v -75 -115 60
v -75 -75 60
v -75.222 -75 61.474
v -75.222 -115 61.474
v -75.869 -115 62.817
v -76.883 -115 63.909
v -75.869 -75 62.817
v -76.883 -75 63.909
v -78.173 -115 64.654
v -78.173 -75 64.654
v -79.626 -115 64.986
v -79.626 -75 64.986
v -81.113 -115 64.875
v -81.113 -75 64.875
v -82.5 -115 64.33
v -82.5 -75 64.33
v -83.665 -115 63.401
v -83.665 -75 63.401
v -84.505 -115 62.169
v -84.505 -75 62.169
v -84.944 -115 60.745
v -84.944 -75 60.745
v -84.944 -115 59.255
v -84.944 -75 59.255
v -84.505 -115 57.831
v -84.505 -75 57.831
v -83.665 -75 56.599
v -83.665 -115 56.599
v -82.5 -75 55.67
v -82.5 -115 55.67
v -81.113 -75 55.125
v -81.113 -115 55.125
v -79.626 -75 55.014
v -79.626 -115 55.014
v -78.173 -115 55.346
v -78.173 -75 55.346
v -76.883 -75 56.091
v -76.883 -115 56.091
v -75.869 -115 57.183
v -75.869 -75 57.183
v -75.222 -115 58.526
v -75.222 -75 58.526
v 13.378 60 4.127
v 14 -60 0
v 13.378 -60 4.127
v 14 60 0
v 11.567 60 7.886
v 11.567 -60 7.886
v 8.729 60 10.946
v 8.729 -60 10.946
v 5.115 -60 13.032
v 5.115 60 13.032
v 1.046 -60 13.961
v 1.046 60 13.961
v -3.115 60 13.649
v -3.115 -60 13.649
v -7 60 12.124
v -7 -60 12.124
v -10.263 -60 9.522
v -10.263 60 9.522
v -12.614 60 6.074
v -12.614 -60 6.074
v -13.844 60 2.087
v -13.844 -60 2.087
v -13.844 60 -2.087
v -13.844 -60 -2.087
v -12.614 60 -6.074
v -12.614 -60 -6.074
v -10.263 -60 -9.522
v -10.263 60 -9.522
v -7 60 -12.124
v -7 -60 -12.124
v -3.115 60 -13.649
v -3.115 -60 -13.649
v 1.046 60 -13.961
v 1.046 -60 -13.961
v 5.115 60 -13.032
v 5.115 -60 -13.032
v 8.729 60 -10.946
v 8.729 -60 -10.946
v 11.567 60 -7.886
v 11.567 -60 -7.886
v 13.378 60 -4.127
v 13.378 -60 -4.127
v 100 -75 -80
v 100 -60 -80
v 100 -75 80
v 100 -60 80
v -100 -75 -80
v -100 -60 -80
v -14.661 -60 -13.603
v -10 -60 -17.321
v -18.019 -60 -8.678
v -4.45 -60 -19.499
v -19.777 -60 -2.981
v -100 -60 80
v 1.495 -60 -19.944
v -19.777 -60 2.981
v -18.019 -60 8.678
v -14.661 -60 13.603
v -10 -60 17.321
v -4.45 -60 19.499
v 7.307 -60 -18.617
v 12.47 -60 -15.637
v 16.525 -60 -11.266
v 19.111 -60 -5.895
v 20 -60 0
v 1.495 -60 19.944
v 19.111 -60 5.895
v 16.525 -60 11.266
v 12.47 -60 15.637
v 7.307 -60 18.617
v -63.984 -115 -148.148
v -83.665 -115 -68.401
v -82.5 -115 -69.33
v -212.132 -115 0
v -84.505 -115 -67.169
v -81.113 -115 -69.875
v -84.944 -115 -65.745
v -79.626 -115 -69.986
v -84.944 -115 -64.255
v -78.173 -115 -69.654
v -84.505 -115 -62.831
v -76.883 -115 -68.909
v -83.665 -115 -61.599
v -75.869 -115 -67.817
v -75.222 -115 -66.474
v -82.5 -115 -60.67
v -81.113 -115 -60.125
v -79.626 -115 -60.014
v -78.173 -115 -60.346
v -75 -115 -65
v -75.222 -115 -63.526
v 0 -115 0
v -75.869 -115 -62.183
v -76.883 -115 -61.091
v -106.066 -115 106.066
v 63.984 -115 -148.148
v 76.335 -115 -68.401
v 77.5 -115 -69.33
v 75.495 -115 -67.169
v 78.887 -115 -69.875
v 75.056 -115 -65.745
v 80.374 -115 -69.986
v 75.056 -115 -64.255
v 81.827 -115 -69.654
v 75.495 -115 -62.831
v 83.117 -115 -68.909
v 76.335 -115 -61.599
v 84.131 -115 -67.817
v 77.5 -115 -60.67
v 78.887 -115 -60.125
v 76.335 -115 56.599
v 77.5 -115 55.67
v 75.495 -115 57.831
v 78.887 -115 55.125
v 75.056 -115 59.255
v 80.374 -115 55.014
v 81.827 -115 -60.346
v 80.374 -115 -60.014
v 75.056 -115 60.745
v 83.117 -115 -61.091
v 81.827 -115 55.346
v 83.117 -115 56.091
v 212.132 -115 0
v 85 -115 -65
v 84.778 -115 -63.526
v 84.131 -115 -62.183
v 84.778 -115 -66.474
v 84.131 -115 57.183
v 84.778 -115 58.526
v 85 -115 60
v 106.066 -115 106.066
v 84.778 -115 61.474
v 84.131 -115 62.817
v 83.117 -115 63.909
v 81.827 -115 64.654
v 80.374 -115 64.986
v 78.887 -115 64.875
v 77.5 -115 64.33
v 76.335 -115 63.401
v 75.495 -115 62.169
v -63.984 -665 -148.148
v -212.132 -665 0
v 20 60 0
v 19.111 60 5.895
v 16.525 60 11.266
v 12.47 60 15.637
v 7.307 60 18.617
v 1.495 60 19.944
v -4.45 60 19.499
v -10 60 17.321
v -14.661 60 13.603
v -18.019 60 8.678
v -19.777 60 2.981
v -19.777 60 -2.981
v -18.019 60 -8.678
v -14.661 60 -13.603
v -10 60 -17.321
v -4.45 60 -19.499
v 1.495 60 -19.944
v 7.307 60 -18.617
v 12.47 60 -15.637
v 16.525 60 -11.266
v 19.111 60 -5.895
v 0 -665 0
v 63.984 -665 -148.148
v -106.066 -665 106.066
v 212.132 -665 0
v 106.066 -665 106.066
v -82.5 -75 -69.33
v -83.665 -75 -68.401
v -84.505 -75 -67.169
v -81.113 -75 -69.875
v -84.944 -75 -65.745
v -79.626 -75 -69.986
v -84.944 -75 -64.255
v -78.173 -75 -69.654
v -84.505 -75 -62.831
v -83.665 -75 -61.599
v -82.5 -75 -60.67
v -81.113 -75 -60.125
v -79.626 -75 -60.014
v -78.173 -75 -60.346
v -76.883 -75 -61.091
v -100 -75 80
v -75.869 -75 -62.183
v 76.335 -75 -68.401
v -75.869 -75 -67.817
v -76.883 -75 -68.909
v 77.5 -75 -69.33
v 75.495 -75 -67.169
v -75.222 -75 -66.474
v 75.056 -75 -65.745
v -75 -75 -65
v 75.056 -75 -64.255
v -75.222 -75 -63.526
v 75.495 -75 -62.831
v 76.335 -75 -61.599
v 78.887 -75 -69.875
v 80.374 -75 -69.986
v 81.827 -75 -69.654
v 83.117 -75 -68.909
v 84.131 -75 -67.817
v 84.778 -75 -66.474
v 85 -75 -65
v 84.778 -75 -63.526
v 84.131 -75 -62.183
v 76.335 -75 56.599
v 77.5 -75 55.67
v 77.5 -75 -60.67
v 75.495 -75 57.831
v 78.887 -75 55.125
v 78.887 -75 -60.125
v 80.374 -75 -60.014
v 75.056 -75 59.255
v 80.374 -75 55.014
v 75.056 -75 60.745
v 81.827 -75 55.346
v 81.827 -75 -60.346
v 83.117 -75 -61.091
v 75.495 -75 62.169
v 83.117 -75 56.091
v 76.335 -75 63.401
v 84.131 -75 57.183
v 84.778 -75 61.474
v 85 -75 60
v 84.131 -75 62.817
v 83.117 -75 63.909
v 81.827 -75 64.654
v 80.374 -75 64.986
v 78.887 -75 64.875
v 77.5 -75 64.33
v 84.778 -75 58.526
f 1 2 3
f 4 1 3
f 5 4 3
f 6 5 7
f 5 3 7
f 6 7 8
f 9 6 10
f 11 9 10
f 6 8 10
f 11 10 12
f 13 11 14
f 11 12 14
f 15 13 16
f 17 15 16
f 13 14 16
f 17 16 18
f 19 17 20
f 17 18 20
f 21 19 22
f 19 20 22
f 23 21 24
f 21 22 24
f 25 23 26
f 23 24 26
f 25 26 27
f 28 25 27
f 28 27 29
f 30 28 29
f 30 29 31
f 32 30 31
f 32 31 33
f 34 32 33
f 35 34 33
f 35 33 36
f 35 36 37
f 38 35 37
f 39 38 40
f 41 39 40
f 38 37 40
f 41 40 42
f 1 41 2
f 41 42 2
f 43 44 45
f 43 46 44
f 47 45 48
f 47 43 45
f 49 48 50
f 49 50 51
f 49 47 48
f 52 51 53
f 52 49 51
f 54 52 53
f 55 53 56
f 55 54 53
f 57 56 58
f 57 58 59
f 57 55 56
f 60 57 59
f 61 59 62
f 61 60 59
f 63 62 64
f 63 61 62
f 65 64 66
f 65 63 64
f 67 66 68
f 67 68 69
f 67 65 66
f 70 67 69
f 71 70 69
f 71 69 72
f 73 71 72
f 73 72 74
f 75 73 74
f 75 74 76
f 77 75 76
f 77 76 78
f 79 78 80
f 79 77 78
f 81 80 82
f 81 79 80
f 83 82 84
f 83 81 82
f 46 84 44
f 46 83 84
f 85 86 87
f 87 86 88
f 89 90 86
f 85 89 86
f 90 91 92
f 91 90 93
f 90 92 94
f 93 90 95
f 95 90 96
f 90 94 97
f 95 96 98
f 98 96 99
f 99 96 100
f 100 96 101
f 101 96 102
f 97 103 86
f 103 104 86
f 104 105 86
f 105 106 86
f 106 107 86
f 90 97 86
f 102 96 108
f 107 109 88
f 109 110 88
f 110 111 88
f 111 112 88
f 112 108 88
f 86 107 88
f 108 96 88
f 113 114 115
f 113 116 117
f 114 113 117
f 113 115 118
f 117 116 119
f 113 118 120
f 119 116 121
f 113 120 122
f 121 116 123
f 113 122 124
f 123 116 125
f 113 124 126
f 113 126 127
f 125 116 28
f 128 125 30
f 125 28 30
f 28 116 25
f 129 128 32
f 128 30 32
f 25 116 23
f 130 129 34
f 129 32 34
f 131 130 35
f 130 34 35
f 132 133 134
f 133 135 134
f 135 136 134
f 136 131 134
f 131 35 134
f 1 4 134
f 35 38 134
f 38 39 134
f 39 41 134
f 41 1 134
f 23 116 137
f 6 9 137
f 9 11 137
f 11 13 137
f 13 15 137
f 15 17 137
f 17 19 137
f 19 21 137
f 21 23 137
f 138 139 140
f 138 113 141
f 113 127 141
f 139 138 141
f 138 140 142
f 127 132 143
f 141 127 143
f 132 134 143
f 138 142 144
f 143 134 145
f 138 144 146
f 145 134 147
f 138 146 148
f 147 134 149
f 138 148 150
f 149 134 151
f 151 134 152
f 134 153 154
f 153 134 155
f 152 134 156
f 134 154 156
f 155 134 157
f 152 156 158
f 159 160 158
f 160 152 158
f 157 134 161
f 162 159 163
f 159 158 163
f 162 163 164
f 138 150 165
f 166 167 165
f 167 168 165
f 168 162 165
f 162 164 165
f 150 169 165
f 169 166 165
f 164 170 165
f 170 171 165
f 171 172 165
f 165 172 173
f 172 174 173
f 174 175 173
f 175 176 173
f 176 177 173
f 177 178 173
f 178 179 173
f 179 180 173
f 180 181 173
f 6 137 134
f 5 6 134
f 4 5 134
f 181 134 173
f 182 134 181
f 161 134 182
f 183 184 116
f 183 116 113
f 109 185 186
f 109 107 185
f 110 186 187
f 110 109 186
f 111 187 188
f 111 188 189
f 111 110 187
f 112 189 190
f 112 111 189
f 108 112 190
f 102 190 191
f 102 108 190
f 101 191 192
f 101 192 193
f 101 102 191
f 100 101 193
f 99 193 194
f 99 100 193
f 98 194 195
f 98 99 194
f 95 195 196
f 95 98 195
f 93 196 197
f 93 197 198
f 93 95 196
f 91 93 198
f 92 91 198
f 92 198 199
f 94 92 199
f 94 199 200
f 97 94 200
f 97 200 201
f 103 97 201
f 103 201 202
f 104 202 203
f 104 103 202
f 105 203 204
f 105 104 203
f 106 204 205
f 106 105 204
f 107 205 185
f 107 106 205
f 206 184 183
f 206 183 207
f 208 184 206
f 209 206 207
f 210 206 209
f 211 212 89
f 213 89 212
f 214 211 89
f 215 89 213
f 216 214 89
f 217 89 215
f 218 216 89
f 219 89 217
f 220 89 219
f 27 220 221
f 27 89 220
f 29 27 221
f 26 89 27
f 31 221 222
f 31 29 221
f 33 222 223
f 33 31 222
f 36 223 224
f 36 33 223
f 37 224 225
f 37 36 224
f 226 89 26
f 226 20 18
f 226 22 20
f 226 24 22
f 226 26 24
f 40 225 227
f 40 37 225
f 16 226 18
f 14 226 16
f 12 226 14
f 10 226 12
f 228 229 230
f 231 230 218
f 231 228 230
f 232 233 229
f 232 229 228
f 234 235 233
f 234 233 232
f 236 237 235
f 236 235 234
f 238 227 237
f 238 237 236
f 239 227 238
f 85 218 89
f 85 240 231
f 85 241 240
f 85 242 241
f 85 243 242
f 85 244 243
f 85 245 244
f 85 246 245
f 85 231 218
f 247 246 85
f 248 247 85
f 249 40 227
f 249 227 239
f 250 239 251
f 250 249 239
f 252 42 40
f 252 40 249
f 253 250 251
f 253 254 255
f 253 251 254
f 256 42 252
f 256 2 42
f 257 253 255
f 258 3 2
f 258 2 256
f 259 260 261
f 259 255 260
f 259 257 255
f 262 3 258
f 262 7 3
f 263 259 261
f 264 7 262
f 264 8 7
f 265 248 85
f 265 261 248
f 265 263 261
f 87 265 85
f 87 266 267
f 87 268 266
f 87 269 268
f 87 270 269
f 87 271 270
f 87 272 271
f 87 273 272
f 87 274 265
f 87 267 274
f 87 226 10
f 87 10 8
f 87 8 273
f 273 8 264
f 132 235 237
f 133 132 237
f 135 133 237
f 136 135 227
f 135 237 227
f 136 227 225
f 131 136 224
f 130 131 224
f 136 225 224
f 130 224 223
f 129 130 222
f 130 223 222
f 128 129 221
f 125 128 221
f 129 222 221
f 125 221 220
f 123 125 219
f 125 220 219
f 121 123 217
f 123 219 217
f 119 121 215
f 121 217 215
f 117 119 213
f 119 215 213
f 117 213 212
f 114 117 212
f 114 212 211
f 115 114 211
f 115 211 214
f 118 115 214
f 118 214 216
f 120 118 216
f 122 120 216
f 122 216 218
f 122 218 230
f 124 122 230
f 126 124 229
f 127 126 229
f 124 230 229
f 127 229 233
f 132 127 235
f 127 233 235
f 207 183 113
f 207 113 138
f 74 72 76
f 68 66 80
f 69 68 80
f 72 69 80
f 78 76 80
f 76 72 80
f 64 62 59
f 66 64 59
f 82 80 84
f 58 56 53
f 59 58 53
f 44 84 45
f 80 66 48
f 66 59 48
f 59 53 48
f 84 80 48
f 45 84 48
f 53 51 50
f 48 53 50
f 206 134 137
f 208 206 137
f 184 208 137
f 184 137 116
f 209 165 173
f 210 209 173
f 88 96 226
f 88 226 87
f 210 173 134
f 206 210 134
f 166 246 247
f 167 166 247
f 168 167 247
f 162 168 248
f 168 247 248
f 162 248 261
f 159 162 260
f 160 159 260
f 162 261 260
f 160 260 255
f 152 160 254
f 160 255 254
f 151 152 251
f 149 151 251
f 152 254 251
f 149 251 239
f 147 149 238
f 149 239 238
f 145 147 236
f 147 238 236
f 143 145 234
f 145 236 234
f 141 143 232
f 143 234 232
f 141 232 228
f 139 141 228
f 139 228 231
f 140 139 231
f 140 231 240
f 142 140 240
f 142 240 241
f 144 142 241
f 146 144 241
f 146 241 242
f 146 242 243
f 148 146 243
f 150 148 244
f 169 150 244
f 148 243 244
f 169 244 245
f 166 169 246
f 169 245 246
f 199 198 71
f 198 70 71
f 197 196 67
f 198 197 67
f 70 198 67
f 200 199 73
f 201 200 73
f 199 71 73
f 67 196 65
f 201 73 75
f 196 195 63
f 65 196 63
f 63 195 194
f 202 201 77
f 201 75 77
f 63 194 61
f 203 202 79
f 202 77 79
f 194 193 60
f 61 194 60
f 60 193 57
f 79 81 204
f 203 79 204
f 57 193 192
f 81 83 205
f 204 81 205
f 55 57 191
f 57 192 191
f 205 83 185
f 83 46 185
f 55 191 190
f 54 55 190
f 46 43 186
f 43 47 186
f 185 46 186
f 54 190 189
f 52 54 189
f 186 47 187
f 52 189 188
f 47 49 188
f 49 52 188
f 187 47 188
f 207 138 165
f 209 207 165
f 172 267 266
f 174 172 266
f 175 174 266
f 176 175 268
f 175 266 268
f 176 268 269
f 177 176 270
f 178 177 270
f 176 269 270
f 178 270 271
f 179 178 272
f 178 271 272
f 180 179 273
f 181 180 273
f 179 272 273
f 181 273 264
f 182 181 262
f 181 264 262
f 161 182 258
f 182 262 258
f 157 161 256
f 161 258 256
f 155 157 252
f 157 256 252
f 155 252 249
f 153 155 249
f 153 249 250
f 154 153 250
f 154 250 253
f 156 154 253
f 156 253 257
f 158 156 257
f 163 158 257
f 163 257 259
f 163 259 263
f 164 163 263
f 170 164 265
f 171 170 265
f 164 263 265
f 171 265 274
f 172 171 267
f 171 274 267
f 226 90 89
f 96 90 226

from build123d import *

# Parameters (mm, degrees)
F0_R     = 20
F0_R_2   = 14
F1_DEPTH = 60
F3_W     = 200
F3_H     = 160
F4_DEPTH = 15
F5_R     = 5
F6_DEPTH = 40
F8_DEPTH = 550


with BuildPart() as f1:
    # F0 (on Front) → F1 (new body, symmetric)
    with BuildSketch(Plane.XZ):
        Circle(F0_R)
        Circle(F0_R_2, mode=Mode.SUBTRACT)
    extrude(amount=F1_DEPTH, both=True)

    # F3 (on offset) → F4 (join)
    with BuildSketch(Plane.XZ.offset(60)):
        Rectangle(F3_W, F3_H)
    extrude(amount=F4_DEPTH)

    # F5 (on face) → F6 (join)
    with BuildSketch(Plane.XZ.offset(75)):
        with Locations((-80, 60)):
            Circle(F5_R)
        with Locations((-80, -65)):
            Circle(F5_R)
        with Locations((80, -65)):
            Circle(F5_R)
        with Locations((80, 60)):
            Circle(F5_R)
    extrude(amount=F6_DEPTH)

    # F7 (on face) → F8 (join)
    with BuildSketch(Plane.XZ.offset(115)):
        Polygon((0, 0), (-106.066017, 106.066017), (-212.132034, 0), (-63.983719, -148.148316), (63.983719, -148.148316), (212.132034, 0), (106.066017, 106.066017), align=None)
    extrude(amount=F8_DEPTH)


solid = f1.part
